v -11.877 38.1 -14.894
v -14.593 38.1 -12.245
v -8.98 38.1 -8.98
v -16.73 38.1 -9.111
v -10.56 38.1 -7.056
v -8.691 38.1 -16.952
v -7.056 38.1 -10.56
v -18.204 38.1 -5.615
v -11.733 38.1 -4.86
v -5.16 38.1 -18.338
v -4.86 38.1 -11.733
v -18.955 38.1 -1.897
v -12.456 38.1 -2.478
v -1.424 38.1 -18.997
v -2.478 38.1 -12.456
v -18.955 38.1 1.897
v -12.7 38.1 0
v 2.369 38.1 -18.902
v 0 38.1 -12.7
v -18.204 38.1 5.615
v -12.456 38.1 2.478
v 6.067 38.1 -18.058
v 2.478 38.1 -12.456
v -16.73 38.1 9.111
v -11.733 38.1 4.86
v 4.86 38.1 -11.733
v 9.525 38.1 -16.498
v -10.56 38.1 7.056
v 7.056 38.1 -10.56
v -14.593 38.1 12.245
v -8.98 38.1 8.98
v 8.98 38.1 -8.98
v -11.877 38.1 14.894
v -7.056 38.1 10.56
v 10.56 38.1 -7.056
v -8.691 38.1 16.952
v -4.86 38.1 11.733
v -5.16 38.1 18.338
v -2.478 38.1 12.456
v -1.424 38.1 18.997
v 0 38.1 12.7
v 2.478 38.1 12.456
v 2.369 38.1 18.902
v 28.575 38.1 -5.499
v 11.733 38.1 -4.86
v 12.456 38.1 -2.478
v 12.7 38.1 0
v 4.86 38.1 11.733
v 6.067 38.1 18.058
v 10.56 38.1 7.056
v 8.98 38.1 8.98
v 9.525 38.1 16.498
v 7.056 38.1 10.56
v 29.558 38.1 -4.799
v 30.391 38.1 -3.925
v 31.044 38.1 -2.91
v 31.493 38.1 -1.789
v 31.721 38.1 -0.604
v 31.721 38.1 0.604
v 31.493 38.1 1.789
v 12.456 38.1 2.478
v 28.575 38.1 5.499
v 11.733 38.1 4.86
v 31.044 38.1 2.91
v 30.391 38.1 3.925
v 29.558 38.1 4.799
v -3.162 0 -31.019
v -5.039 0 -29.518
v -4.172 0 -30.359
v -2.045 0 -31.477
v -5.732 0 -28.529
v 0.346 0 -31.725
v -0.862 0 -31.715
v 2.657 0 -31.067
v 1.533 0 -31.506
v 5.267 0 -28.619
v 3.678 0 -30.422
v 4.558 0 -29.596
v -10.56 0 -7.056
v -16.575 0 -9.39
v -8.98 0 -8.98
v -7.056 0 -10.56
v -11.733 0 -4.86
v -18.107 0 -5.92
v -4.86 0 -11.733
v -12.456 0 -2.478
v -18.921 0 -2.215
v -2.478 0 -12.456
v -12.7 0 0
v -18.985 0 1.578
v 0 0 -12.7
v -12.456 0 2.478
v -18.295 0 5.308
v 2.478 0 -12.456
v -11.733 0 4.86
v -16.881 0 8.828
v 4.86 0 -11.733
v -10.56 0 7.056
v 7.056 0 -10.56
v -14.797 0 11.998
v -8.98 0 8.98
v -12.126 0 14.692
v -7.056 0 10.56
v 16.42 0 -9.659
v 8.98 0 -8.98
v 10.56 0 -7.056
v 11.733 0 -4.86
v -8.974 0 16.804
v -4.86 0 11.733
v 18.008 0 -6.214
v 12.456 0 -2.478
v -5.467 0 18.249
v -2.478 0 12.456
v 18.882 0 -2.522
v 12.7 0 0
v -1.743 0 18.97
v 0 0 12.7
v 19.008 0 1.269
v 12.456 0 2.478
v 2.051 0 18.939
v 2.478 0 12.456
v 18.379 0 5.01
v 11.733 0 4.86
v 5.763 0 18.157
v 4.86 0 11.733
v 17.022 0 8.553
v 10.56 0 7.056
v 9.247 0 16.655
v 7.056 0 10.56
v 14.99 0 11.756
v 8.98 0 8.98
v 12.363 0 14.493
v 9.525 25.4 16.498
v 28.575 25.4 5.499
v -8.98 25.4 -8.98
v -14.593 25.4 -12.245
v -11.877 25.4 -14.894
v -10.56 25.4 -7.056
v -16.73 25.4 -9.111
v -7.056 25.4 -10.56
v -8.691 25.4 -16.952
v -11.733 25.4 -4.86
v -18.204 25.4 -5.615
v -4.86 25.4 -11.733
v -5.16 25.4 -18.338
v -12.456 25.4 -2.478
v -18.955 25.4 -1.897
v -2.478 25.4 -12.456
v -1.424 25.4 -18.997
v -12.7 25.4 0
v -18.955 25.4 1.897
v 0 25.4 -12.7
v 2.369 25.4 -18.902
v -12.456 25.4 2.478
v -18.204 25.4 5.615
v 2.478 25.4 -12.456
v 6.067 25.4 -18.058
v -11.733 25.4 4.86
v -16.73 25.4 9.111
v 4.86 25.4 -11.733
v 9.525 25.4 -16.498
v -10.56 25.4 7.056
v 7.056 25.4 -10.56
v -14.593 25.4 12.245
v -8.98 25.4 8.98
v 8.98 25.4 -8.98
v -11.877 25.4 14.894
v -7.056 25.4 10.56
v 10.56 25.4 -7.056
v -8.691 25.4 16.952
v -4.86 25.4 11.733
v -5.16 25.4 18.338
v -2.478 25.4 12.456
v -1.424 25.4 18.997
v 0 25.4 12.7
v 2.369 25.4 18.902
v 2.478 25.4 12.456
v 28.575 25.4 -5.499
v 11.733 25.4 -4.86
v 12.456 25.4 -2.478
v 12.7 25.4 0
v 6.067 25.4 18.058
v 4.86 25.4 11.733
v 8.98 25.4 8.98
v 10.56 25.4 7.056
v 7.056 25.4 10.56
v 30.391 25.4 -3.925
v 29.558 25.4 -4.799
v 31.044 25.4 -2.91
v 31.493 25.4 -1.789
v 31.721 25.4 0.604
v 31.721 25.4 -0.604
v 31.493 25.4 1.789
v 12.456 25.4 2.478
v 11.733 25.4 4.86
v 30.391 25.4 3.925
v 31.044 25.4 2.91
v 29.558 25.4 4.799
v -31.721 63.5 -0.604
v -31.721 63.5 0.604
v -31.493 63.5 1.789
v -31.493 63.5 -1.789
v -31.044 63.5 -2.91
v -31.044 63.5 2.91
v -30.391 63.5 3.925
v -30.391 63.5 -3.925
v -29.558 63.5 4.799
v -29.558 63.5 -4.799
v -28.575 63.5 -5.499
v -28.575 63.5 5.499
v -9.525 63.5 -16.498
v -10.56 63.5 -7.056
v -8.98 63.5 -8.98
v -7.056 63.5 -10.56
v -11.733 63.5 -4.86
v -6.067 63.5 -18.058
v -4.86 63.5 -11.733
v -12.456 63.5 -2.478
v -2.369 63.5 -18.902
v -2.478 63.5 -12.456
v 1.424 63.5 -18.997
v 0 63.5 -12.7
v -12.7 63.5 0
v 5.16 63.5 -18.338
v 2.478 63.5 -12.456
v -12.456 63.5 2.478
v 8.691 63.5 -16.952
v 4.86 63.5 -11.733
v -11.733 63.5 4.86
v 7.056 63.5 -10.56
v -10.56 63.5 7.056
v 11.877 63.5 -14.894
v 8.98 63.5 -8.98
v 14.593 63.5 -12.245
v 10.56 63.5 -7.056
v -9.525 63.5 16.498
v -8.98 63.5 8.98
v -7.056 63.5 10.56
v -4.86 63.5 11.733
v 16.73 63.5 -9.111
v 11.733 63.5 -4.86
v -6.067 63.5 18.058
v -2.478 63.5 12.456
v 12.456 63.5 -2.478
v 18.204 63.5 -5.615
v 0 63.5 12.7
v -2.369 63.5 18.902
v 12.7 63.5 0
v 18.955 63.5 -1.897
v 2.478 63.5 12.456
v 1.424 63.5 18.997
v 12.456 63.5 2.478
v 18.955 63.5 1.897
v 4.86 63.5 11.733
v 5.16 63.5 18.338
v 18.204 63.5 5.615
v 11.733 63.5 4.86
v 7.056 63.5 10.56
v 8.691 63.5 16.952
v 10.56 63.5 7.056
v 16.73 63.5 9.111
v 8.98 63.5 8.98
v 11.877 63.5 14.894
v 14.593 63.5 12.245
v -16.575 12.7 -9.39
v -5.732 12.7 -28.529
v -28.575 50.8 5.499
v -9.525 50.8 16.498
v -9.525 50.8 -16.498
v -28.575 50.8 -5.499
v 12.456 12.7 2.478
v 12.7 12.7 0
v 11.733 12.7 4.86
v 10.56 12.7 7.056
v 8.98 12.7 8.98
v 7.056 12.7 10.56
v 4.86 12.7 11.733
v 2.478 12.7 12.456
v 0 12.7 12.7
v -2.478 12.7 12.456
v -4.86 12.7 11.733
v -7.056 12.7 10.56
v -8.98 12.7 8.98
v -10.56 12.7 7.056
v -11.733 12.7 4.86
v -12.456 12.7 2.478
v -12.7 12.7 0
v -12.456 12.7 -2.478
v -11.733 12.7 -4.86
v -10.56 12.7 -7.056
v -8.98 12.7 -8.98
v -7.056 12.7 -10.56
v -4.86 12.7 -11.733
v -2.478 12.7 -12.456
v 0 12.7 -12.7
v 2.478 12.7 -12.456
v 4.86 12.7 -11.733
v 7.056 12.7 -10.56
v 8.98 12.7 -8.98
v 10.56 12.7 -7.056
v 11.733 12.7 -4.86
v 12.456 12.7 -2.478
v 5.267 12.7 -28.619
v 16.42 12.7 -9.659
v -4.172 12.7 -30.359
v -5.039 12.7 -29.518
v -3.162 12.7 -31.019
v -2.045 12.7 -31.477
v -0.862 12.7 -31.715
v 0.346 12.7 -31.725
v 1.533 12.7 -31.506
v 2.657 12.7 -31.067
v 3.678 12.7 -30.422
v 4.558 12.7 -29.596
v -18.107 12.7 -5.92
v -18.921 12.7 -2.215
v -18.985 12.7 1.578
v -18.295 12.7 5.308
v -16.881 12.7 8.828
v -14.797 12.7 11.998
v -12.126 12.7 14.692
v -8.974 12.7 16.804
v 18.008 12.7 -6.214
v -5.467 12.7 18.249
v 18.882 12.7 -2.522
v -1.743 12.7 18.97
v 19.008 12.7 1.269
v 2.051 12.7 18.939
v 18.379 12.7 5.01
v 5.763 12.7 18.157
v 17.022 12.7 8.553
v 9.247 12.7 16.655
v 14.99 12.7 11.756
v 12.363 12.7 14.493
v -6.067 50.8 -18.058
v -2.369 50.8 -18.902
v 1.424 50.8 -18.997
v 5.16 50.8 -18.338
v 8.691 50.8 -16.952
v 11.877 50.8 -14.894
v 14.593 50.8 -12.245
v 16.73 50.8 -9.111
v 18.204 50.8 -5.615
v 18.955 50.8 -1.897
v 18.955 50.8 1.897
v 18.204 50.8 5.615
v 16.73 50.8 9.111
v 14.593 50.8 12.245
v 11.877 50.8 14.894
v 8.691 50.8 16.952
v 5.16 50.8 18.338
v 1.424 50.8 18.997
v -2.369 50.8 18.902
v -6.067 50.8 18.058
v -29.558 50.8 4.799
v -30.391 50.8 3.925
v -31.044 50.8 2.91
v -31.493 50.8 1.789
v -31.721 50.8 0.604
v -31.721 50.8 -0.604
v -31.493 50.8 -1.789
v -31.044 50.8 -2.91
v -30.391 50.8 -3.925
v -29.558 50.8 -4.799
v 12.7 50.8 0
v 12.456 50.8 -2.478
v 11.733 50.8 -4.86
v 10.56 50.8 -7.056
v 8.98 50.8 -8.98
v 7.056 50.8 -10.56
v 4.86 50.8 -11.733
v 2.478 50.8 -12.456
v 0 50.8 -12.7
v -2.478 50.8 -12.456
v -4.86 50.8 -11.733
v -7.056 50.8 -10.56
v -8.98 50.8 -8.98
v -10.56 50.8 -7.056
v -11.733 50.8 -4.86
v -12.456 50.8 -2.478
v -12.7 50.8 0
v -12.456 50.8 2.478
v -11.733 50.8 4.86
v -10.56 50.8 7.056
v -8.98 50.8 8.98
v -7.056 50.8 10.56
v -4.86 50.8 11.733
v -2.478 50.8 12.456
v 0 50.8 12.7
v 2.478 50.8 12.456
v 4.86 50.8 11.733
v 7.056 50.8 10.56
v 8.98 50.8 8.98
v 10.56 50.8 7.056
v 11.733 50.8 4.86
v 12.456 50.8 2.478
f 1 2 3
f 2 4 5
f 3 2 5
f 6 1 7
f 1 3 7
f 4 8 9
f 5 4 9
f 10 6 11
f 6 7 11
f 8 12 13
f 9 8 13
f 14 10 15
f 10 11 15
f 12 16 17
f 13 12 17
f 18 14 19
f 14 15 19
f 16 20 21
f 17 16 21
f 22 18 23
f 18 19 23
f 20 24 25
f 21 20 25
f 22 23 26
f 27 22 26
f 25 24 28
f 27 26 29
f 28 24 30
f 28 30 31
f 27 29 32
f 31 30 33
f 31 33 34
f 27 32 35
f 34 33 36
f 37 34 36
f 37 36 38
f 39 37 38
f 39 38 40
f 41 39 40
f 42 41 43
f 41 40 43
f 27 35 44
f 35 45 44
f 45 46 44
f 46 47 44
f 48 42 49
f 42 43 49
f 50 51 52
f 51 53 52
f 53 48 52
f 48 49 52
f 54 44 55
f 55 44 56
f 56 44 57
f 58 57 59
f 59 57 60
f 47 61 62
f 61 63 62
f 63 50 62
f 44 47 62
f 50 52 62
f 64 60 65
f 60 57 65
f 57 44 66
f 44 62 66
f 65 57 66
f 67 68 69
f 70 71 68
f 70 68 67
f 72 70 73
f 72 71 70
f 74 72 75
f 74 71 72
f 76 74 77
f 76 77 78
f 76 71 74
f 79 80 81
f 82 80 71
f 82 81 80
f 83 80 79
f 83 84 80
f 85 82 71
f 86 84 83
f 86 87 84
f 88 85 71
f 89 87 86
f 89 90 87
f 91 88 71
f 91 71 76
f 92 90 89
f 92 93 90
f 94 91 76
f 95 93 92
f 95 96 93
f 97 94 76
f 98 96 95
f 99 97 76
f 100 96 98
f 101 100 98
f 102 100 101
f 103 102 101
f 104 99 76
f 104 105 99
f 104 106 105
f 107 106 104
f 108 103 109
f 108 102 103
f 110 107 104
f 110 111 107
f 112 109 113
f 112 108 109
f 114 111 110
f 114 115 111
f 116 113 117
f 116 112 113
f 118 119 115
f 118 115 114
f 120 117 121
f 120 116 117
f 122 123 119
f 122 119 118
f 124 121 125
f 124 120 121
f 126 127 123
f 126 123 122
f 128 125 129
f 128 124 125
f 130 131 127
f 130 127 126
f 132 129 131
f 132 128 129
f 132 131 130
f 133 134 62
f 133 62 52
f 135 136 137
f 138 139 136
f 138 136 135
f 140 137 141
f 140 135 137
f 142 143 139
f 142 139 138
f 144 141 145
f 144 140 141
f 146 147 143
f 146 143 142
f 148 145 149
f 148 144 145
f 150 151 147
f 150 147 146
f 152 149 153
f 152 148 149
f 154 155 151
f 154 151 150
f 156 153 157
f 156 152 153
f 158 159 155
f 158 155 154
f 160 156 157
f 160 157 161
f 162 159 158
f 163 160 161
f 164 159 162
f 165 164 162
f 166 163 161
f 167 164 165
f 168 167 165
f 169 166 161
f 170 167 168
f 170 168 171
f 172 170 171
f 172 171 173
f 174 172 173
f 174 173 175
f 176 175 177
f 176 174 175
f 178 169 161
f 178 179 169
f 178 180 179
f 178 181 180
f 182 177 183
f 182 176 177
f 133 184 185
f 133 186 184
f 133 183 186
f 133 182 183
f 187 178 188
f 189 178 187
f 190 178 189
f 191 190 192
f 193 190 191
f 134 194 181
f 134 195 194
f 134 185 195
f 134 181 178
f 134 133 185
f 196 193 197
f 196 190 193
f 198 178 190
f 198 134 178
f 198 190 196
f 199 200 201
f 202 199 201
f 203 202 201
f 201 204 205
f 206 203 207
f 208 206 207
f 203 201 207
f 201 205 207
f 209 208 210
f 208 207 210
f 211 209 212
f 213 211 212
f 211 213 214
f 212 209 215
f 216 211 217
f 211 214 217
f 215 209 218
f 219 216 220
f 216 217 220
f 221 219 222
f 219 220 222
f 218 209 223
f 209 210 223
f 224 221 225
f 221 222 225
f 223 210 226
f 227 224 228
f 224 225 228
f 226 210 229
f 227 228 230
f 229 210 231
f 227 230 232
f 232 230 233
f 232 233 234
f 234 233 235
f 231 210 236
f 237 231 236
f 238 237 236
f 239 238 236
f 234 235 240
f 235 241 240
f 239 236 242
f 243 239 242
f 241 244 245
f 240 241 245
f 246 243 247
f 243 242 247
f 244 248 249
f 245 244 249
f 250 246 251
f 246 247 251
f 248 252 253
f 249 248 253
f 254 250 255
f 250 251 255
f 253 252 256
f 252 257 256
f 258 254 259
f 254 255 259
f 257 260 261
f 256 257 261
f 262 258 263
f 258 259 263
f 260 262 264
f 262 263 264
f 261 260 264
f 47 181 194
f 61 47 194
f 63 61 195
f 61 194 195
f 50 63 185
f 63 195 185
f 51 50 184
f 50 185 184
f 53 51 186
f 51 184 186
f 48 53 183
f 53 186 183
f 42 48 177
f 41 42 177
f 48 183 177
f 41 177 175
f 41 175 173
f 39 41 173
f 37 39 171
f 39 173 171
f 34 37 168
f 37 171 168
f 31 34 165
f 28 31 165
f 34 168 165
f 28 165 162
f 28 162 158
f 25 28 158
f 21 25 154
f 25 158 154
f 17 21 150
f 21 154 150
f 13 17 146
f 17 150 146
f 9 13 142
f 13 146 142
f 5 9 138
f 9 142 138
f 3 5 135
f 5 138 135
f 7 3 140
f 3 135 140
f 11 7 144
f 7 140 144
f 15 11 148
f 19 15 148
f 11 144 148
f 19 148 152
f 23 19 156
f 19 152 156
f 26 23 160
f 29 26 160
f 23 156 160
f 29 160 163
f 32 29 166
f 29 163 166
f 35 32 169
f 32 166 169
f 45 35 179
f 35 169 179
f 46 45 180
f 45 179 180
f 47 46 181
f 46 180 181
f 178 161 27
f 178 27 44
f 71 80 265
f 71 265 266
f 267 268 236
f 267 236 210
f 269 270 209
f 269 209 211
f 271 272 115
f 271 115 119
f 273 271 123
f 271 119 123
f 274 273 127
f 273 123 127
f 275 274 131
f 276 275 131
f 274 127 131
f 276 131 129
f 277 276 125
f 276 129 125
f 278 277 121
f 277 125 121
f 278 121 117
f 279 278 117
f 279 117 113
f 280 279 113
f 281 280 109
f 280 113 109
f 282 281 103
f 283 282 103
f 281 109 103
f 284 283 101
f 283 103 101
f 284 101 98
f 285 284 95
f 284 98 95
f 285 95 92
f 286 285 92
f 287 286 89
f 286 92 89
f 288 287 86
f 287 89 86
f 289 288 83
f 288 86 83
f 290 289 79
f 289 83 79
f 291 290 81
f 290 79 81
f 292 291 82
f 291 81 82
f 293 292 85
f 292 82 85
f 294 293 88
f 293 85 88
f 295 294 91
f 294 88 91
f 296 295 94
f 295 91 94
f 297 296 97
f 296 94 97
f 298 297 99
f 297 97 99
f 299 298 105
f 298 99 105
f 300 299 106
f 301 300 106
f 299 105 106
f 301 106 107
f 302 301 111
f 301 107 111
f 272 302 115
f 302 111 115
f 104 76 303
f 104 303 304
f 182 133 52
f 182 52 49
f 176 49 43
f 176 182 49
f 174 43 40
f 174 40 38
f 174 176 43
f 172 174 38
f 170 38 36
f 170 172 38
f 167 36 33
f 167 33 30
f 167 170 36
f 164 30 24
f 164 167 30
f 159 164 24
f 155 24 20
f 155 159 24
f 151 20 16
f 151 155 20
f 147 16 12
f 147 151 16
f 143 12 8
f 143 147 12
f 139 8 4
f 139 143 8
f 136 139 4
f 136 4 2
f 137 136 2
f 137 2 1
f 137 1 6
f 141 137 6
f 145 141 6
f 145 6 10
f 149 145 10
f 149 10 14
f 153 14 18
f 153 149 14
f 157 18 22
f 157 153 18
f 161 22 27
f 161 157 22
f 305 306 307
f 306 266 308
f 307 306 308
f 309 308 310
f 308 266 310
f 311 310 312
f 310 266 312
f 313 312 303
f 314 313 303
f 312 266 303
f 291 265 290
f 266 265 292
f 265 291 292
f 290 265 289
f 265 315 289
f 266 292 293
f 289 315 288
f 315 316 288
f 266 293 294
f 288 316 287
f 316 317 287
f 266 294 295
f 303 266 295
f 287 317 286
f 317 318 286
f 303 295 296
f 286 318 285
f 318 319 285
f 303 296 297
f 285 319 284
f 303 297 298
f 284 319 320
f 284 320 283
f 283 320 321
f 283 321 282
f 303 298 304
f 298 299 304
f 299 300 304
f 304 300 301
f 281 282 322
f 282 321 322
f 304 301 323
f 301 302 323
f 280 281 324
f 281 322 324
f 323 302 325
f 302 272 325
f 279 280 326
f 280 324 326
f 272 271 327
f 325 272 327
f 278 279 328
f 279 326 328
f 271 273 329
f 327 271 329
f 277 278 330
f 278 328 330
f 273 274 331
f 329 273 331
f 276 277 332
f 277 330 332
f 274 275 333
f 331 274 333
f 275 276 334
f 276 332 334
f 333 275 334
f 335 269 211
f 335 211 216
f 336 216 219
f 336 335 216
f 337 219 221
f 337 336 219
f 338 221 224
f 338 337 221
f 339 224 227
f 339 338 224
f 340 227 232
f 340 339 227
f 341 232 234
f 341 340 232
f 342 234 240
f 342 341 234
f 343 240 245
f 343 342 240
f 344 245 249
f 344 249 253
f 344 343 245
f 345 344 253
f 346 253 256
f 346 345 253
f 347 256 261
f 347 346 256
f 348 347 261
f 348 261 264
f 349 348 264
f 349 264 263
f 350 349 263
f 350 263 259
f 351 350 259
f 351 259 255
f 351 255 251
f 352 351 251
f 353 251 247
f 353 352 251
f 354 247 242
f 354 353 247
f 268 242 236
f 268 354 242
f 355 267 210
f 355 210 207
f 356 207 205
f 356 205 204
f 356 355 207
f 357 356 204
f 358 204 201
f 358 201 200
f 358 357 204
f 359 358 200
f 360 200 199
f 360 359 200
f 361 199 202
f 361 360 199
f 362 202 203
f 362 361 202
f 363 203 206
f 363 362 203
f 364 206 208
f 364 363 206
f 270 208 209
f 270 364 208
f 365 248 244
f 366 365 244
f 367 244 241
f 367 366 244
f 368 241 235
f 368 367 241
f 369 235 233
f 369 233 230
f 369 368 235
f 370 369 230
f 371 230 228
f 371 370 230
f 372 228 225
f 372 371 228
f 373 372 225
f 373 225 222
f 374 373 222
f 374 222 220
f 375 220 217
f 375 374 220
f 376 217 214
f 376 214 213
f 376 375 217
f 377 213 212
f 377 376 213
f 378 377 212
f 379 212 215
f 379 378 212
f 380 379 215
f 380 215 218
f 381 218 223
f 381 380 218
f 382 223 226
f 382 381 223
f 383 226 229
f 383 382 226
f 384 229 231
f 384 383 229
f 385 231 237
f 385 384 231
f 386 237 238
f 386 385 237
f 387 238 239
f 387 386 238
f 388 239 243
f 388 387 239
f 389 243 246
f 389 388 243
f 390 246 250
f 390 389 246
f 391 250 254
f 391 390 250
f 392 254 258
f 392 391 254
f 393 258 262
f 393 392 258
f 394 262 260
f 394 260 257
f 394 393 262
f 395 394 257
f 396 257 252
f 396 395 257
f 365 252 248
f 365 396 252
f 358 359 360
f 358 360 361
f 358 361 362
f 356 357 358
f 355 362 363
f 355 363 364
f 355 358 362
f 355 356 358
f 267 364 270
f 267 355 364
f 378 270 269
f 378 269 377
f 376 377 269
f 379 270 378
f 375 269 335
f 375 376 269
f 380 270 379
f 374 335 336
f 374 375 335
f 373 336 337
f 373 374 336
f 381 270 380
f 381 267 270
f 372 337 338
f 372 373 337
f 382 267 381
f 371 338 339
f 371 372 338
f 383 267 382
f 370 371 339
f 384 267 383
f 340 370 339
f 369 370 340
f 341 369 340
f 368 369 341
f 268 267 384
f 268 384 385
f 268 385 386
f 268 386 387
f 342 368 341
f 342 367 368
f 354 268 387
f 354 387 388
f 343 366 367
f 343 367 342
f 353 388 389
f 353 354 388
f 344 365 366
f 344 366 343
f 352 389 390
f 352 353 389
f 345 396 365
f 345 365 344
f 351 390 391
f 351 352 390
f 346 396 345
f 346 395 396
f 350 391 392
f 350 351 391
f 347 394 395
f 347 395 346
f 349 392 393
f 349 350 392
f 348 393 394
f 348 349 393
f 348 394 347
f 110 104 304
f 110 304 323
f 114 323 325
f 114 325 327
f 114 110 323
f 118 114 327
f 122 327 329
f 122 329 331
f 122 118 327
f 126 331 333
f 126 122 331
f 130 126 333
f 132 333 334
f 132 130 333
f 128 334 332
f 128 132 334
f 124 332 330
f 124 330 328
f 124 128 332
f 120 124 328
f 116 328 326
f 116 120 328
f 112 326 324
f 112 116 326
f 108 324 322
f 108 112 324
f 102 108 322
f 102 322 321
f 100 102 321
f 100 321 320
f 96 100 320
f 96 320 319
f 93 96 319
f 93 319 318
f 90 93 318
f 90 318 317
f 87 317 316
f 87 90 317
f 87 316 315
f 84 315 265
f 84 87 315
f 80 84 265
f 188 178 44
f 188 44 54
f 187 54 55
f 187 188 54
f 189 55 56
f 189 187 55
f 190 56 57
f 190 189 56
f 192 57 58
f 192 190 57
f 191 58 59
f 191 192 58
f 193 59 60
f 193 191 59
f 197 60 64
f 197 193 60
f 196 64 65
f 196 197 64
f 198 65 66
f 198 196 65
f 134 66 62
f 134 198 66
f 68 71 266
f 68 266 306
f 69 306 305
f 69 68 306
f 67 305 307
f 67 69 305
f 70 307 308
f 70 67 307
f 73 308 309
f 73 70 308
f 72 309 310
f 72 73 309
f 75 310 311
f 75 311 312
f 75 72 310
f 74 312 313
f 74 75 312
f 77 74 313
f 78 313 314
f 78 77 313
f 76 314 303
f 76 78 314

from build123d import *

# Parameters (mm, degrees)
F0_R      = 12.7
F1_DEPTH  = 12.7
F4_R      = 12.7
F5_DEPTH  = 12.7
F1_FACE_R = 12.7
F7_DEPTH  = 12.7


with BuildPart() as f1:
    # F0 (on Front) → F1 (new body)
    with BuildSketch(Plane.XZ):
        with BuildLine():
            Line((-16.5747123475, -9.3904957588), (-5.7315018392, -28.52932503))
            ThreePointArc((-5.7315018392, -28.52932503), (-0.2582471542, -31.7489497213), (5.2666569617, -28.6187844684))
            Line((5.2666569617, -28.6187844684), (16.419764055, -9.658874074))
            ThreePointArc((16.419764055, -9.658874074), (0.1549482925, 19.0493698328), (-16.5747123475, -9.3904957588))
        make_face()
        Circle(F0_R, mode=Mode.SUBTRACT)
    extrude(amount=-F1_DEPTH)

    # F6 (on offset) + F1_face (on face) → F7 (join)
    with BuildSketch(Plane.XZ.offset(-50.8)):
        with BuildLine():
            Line((-28.575, -5.499261314), (-9.525, -16.4977839421))
            ThreePointArc((-9.525, -16.4977839421), (19.05, 0), (-9.525, 16.4977839421))
            Line((-9.525, 16.4977839421), (-28.575, 5.499261314))
            ThreePointArc((-28.575, 5.499261314), (-31.75, 0), (-28.575, -5.499261314))
        make_face()
        with BuildLine():
            ThreePointArc((-12.7, 0), (0, 12.7), (12.7, 0))
            ThreePointArc((12.7, 0), (0, -12.7), (-12.7, 0))
        make_face(mode=Mode.SUBTRACT)
    with BuildSketch(Plane(origin=(-0.0482132314, 0, -5.927342989), x_dir=(1, 0, 0), z_dir=(0, -1, 0))):
        with BuildLine():
            ThreePointArc((16.4679772864, -3.731531085), (0.2031615239, 24.9767128218), (-16.5264991162, -3.4631527698))
            Line((-16.5264991162, -3.4631527698), (-5.6832886078, -22.601982041))
            ThreePointArc((-5.6832886078, -22.601982041), (-0.2100339228, -25.8216067323), (5.314870193, -22.6914414794))
            Line((5.314870193, -22.6914414794), (16.4679772864, -3.731531085))
        make_face()
        with Locations((0.0482132314, 5.927342989)):
            Circle(F1_FACE_R, mode=Mode.SUBTRACT)
    extrude(amount=-F7_DEPTH)


with BuildPart() as f5:
    # F4 (on offset) → F5 (new body)
    with BuildSketch(Plane.XZ.offset(-25.4)):
        with BuildLine():
            Line((28.575, 5.499261314), (9.525, 16.4977839421))
            ThreePointArc((9.525, 16.4977839421), (-19.05, 0), (9.525, -16.4977839421))
            Line((9.525, -16.4977839421), (28.575, -5.499261314))
            ThreePointArc((28.575, -5.499261314), (31.75, 0), (28.575, 5.499261314))
        make_face()
        Circle(F4_R, mode=Mode.SUBTRACT)
    extrude(amount=-F5_DEPTH)


solid = Compound([f1.part, f5.part])
